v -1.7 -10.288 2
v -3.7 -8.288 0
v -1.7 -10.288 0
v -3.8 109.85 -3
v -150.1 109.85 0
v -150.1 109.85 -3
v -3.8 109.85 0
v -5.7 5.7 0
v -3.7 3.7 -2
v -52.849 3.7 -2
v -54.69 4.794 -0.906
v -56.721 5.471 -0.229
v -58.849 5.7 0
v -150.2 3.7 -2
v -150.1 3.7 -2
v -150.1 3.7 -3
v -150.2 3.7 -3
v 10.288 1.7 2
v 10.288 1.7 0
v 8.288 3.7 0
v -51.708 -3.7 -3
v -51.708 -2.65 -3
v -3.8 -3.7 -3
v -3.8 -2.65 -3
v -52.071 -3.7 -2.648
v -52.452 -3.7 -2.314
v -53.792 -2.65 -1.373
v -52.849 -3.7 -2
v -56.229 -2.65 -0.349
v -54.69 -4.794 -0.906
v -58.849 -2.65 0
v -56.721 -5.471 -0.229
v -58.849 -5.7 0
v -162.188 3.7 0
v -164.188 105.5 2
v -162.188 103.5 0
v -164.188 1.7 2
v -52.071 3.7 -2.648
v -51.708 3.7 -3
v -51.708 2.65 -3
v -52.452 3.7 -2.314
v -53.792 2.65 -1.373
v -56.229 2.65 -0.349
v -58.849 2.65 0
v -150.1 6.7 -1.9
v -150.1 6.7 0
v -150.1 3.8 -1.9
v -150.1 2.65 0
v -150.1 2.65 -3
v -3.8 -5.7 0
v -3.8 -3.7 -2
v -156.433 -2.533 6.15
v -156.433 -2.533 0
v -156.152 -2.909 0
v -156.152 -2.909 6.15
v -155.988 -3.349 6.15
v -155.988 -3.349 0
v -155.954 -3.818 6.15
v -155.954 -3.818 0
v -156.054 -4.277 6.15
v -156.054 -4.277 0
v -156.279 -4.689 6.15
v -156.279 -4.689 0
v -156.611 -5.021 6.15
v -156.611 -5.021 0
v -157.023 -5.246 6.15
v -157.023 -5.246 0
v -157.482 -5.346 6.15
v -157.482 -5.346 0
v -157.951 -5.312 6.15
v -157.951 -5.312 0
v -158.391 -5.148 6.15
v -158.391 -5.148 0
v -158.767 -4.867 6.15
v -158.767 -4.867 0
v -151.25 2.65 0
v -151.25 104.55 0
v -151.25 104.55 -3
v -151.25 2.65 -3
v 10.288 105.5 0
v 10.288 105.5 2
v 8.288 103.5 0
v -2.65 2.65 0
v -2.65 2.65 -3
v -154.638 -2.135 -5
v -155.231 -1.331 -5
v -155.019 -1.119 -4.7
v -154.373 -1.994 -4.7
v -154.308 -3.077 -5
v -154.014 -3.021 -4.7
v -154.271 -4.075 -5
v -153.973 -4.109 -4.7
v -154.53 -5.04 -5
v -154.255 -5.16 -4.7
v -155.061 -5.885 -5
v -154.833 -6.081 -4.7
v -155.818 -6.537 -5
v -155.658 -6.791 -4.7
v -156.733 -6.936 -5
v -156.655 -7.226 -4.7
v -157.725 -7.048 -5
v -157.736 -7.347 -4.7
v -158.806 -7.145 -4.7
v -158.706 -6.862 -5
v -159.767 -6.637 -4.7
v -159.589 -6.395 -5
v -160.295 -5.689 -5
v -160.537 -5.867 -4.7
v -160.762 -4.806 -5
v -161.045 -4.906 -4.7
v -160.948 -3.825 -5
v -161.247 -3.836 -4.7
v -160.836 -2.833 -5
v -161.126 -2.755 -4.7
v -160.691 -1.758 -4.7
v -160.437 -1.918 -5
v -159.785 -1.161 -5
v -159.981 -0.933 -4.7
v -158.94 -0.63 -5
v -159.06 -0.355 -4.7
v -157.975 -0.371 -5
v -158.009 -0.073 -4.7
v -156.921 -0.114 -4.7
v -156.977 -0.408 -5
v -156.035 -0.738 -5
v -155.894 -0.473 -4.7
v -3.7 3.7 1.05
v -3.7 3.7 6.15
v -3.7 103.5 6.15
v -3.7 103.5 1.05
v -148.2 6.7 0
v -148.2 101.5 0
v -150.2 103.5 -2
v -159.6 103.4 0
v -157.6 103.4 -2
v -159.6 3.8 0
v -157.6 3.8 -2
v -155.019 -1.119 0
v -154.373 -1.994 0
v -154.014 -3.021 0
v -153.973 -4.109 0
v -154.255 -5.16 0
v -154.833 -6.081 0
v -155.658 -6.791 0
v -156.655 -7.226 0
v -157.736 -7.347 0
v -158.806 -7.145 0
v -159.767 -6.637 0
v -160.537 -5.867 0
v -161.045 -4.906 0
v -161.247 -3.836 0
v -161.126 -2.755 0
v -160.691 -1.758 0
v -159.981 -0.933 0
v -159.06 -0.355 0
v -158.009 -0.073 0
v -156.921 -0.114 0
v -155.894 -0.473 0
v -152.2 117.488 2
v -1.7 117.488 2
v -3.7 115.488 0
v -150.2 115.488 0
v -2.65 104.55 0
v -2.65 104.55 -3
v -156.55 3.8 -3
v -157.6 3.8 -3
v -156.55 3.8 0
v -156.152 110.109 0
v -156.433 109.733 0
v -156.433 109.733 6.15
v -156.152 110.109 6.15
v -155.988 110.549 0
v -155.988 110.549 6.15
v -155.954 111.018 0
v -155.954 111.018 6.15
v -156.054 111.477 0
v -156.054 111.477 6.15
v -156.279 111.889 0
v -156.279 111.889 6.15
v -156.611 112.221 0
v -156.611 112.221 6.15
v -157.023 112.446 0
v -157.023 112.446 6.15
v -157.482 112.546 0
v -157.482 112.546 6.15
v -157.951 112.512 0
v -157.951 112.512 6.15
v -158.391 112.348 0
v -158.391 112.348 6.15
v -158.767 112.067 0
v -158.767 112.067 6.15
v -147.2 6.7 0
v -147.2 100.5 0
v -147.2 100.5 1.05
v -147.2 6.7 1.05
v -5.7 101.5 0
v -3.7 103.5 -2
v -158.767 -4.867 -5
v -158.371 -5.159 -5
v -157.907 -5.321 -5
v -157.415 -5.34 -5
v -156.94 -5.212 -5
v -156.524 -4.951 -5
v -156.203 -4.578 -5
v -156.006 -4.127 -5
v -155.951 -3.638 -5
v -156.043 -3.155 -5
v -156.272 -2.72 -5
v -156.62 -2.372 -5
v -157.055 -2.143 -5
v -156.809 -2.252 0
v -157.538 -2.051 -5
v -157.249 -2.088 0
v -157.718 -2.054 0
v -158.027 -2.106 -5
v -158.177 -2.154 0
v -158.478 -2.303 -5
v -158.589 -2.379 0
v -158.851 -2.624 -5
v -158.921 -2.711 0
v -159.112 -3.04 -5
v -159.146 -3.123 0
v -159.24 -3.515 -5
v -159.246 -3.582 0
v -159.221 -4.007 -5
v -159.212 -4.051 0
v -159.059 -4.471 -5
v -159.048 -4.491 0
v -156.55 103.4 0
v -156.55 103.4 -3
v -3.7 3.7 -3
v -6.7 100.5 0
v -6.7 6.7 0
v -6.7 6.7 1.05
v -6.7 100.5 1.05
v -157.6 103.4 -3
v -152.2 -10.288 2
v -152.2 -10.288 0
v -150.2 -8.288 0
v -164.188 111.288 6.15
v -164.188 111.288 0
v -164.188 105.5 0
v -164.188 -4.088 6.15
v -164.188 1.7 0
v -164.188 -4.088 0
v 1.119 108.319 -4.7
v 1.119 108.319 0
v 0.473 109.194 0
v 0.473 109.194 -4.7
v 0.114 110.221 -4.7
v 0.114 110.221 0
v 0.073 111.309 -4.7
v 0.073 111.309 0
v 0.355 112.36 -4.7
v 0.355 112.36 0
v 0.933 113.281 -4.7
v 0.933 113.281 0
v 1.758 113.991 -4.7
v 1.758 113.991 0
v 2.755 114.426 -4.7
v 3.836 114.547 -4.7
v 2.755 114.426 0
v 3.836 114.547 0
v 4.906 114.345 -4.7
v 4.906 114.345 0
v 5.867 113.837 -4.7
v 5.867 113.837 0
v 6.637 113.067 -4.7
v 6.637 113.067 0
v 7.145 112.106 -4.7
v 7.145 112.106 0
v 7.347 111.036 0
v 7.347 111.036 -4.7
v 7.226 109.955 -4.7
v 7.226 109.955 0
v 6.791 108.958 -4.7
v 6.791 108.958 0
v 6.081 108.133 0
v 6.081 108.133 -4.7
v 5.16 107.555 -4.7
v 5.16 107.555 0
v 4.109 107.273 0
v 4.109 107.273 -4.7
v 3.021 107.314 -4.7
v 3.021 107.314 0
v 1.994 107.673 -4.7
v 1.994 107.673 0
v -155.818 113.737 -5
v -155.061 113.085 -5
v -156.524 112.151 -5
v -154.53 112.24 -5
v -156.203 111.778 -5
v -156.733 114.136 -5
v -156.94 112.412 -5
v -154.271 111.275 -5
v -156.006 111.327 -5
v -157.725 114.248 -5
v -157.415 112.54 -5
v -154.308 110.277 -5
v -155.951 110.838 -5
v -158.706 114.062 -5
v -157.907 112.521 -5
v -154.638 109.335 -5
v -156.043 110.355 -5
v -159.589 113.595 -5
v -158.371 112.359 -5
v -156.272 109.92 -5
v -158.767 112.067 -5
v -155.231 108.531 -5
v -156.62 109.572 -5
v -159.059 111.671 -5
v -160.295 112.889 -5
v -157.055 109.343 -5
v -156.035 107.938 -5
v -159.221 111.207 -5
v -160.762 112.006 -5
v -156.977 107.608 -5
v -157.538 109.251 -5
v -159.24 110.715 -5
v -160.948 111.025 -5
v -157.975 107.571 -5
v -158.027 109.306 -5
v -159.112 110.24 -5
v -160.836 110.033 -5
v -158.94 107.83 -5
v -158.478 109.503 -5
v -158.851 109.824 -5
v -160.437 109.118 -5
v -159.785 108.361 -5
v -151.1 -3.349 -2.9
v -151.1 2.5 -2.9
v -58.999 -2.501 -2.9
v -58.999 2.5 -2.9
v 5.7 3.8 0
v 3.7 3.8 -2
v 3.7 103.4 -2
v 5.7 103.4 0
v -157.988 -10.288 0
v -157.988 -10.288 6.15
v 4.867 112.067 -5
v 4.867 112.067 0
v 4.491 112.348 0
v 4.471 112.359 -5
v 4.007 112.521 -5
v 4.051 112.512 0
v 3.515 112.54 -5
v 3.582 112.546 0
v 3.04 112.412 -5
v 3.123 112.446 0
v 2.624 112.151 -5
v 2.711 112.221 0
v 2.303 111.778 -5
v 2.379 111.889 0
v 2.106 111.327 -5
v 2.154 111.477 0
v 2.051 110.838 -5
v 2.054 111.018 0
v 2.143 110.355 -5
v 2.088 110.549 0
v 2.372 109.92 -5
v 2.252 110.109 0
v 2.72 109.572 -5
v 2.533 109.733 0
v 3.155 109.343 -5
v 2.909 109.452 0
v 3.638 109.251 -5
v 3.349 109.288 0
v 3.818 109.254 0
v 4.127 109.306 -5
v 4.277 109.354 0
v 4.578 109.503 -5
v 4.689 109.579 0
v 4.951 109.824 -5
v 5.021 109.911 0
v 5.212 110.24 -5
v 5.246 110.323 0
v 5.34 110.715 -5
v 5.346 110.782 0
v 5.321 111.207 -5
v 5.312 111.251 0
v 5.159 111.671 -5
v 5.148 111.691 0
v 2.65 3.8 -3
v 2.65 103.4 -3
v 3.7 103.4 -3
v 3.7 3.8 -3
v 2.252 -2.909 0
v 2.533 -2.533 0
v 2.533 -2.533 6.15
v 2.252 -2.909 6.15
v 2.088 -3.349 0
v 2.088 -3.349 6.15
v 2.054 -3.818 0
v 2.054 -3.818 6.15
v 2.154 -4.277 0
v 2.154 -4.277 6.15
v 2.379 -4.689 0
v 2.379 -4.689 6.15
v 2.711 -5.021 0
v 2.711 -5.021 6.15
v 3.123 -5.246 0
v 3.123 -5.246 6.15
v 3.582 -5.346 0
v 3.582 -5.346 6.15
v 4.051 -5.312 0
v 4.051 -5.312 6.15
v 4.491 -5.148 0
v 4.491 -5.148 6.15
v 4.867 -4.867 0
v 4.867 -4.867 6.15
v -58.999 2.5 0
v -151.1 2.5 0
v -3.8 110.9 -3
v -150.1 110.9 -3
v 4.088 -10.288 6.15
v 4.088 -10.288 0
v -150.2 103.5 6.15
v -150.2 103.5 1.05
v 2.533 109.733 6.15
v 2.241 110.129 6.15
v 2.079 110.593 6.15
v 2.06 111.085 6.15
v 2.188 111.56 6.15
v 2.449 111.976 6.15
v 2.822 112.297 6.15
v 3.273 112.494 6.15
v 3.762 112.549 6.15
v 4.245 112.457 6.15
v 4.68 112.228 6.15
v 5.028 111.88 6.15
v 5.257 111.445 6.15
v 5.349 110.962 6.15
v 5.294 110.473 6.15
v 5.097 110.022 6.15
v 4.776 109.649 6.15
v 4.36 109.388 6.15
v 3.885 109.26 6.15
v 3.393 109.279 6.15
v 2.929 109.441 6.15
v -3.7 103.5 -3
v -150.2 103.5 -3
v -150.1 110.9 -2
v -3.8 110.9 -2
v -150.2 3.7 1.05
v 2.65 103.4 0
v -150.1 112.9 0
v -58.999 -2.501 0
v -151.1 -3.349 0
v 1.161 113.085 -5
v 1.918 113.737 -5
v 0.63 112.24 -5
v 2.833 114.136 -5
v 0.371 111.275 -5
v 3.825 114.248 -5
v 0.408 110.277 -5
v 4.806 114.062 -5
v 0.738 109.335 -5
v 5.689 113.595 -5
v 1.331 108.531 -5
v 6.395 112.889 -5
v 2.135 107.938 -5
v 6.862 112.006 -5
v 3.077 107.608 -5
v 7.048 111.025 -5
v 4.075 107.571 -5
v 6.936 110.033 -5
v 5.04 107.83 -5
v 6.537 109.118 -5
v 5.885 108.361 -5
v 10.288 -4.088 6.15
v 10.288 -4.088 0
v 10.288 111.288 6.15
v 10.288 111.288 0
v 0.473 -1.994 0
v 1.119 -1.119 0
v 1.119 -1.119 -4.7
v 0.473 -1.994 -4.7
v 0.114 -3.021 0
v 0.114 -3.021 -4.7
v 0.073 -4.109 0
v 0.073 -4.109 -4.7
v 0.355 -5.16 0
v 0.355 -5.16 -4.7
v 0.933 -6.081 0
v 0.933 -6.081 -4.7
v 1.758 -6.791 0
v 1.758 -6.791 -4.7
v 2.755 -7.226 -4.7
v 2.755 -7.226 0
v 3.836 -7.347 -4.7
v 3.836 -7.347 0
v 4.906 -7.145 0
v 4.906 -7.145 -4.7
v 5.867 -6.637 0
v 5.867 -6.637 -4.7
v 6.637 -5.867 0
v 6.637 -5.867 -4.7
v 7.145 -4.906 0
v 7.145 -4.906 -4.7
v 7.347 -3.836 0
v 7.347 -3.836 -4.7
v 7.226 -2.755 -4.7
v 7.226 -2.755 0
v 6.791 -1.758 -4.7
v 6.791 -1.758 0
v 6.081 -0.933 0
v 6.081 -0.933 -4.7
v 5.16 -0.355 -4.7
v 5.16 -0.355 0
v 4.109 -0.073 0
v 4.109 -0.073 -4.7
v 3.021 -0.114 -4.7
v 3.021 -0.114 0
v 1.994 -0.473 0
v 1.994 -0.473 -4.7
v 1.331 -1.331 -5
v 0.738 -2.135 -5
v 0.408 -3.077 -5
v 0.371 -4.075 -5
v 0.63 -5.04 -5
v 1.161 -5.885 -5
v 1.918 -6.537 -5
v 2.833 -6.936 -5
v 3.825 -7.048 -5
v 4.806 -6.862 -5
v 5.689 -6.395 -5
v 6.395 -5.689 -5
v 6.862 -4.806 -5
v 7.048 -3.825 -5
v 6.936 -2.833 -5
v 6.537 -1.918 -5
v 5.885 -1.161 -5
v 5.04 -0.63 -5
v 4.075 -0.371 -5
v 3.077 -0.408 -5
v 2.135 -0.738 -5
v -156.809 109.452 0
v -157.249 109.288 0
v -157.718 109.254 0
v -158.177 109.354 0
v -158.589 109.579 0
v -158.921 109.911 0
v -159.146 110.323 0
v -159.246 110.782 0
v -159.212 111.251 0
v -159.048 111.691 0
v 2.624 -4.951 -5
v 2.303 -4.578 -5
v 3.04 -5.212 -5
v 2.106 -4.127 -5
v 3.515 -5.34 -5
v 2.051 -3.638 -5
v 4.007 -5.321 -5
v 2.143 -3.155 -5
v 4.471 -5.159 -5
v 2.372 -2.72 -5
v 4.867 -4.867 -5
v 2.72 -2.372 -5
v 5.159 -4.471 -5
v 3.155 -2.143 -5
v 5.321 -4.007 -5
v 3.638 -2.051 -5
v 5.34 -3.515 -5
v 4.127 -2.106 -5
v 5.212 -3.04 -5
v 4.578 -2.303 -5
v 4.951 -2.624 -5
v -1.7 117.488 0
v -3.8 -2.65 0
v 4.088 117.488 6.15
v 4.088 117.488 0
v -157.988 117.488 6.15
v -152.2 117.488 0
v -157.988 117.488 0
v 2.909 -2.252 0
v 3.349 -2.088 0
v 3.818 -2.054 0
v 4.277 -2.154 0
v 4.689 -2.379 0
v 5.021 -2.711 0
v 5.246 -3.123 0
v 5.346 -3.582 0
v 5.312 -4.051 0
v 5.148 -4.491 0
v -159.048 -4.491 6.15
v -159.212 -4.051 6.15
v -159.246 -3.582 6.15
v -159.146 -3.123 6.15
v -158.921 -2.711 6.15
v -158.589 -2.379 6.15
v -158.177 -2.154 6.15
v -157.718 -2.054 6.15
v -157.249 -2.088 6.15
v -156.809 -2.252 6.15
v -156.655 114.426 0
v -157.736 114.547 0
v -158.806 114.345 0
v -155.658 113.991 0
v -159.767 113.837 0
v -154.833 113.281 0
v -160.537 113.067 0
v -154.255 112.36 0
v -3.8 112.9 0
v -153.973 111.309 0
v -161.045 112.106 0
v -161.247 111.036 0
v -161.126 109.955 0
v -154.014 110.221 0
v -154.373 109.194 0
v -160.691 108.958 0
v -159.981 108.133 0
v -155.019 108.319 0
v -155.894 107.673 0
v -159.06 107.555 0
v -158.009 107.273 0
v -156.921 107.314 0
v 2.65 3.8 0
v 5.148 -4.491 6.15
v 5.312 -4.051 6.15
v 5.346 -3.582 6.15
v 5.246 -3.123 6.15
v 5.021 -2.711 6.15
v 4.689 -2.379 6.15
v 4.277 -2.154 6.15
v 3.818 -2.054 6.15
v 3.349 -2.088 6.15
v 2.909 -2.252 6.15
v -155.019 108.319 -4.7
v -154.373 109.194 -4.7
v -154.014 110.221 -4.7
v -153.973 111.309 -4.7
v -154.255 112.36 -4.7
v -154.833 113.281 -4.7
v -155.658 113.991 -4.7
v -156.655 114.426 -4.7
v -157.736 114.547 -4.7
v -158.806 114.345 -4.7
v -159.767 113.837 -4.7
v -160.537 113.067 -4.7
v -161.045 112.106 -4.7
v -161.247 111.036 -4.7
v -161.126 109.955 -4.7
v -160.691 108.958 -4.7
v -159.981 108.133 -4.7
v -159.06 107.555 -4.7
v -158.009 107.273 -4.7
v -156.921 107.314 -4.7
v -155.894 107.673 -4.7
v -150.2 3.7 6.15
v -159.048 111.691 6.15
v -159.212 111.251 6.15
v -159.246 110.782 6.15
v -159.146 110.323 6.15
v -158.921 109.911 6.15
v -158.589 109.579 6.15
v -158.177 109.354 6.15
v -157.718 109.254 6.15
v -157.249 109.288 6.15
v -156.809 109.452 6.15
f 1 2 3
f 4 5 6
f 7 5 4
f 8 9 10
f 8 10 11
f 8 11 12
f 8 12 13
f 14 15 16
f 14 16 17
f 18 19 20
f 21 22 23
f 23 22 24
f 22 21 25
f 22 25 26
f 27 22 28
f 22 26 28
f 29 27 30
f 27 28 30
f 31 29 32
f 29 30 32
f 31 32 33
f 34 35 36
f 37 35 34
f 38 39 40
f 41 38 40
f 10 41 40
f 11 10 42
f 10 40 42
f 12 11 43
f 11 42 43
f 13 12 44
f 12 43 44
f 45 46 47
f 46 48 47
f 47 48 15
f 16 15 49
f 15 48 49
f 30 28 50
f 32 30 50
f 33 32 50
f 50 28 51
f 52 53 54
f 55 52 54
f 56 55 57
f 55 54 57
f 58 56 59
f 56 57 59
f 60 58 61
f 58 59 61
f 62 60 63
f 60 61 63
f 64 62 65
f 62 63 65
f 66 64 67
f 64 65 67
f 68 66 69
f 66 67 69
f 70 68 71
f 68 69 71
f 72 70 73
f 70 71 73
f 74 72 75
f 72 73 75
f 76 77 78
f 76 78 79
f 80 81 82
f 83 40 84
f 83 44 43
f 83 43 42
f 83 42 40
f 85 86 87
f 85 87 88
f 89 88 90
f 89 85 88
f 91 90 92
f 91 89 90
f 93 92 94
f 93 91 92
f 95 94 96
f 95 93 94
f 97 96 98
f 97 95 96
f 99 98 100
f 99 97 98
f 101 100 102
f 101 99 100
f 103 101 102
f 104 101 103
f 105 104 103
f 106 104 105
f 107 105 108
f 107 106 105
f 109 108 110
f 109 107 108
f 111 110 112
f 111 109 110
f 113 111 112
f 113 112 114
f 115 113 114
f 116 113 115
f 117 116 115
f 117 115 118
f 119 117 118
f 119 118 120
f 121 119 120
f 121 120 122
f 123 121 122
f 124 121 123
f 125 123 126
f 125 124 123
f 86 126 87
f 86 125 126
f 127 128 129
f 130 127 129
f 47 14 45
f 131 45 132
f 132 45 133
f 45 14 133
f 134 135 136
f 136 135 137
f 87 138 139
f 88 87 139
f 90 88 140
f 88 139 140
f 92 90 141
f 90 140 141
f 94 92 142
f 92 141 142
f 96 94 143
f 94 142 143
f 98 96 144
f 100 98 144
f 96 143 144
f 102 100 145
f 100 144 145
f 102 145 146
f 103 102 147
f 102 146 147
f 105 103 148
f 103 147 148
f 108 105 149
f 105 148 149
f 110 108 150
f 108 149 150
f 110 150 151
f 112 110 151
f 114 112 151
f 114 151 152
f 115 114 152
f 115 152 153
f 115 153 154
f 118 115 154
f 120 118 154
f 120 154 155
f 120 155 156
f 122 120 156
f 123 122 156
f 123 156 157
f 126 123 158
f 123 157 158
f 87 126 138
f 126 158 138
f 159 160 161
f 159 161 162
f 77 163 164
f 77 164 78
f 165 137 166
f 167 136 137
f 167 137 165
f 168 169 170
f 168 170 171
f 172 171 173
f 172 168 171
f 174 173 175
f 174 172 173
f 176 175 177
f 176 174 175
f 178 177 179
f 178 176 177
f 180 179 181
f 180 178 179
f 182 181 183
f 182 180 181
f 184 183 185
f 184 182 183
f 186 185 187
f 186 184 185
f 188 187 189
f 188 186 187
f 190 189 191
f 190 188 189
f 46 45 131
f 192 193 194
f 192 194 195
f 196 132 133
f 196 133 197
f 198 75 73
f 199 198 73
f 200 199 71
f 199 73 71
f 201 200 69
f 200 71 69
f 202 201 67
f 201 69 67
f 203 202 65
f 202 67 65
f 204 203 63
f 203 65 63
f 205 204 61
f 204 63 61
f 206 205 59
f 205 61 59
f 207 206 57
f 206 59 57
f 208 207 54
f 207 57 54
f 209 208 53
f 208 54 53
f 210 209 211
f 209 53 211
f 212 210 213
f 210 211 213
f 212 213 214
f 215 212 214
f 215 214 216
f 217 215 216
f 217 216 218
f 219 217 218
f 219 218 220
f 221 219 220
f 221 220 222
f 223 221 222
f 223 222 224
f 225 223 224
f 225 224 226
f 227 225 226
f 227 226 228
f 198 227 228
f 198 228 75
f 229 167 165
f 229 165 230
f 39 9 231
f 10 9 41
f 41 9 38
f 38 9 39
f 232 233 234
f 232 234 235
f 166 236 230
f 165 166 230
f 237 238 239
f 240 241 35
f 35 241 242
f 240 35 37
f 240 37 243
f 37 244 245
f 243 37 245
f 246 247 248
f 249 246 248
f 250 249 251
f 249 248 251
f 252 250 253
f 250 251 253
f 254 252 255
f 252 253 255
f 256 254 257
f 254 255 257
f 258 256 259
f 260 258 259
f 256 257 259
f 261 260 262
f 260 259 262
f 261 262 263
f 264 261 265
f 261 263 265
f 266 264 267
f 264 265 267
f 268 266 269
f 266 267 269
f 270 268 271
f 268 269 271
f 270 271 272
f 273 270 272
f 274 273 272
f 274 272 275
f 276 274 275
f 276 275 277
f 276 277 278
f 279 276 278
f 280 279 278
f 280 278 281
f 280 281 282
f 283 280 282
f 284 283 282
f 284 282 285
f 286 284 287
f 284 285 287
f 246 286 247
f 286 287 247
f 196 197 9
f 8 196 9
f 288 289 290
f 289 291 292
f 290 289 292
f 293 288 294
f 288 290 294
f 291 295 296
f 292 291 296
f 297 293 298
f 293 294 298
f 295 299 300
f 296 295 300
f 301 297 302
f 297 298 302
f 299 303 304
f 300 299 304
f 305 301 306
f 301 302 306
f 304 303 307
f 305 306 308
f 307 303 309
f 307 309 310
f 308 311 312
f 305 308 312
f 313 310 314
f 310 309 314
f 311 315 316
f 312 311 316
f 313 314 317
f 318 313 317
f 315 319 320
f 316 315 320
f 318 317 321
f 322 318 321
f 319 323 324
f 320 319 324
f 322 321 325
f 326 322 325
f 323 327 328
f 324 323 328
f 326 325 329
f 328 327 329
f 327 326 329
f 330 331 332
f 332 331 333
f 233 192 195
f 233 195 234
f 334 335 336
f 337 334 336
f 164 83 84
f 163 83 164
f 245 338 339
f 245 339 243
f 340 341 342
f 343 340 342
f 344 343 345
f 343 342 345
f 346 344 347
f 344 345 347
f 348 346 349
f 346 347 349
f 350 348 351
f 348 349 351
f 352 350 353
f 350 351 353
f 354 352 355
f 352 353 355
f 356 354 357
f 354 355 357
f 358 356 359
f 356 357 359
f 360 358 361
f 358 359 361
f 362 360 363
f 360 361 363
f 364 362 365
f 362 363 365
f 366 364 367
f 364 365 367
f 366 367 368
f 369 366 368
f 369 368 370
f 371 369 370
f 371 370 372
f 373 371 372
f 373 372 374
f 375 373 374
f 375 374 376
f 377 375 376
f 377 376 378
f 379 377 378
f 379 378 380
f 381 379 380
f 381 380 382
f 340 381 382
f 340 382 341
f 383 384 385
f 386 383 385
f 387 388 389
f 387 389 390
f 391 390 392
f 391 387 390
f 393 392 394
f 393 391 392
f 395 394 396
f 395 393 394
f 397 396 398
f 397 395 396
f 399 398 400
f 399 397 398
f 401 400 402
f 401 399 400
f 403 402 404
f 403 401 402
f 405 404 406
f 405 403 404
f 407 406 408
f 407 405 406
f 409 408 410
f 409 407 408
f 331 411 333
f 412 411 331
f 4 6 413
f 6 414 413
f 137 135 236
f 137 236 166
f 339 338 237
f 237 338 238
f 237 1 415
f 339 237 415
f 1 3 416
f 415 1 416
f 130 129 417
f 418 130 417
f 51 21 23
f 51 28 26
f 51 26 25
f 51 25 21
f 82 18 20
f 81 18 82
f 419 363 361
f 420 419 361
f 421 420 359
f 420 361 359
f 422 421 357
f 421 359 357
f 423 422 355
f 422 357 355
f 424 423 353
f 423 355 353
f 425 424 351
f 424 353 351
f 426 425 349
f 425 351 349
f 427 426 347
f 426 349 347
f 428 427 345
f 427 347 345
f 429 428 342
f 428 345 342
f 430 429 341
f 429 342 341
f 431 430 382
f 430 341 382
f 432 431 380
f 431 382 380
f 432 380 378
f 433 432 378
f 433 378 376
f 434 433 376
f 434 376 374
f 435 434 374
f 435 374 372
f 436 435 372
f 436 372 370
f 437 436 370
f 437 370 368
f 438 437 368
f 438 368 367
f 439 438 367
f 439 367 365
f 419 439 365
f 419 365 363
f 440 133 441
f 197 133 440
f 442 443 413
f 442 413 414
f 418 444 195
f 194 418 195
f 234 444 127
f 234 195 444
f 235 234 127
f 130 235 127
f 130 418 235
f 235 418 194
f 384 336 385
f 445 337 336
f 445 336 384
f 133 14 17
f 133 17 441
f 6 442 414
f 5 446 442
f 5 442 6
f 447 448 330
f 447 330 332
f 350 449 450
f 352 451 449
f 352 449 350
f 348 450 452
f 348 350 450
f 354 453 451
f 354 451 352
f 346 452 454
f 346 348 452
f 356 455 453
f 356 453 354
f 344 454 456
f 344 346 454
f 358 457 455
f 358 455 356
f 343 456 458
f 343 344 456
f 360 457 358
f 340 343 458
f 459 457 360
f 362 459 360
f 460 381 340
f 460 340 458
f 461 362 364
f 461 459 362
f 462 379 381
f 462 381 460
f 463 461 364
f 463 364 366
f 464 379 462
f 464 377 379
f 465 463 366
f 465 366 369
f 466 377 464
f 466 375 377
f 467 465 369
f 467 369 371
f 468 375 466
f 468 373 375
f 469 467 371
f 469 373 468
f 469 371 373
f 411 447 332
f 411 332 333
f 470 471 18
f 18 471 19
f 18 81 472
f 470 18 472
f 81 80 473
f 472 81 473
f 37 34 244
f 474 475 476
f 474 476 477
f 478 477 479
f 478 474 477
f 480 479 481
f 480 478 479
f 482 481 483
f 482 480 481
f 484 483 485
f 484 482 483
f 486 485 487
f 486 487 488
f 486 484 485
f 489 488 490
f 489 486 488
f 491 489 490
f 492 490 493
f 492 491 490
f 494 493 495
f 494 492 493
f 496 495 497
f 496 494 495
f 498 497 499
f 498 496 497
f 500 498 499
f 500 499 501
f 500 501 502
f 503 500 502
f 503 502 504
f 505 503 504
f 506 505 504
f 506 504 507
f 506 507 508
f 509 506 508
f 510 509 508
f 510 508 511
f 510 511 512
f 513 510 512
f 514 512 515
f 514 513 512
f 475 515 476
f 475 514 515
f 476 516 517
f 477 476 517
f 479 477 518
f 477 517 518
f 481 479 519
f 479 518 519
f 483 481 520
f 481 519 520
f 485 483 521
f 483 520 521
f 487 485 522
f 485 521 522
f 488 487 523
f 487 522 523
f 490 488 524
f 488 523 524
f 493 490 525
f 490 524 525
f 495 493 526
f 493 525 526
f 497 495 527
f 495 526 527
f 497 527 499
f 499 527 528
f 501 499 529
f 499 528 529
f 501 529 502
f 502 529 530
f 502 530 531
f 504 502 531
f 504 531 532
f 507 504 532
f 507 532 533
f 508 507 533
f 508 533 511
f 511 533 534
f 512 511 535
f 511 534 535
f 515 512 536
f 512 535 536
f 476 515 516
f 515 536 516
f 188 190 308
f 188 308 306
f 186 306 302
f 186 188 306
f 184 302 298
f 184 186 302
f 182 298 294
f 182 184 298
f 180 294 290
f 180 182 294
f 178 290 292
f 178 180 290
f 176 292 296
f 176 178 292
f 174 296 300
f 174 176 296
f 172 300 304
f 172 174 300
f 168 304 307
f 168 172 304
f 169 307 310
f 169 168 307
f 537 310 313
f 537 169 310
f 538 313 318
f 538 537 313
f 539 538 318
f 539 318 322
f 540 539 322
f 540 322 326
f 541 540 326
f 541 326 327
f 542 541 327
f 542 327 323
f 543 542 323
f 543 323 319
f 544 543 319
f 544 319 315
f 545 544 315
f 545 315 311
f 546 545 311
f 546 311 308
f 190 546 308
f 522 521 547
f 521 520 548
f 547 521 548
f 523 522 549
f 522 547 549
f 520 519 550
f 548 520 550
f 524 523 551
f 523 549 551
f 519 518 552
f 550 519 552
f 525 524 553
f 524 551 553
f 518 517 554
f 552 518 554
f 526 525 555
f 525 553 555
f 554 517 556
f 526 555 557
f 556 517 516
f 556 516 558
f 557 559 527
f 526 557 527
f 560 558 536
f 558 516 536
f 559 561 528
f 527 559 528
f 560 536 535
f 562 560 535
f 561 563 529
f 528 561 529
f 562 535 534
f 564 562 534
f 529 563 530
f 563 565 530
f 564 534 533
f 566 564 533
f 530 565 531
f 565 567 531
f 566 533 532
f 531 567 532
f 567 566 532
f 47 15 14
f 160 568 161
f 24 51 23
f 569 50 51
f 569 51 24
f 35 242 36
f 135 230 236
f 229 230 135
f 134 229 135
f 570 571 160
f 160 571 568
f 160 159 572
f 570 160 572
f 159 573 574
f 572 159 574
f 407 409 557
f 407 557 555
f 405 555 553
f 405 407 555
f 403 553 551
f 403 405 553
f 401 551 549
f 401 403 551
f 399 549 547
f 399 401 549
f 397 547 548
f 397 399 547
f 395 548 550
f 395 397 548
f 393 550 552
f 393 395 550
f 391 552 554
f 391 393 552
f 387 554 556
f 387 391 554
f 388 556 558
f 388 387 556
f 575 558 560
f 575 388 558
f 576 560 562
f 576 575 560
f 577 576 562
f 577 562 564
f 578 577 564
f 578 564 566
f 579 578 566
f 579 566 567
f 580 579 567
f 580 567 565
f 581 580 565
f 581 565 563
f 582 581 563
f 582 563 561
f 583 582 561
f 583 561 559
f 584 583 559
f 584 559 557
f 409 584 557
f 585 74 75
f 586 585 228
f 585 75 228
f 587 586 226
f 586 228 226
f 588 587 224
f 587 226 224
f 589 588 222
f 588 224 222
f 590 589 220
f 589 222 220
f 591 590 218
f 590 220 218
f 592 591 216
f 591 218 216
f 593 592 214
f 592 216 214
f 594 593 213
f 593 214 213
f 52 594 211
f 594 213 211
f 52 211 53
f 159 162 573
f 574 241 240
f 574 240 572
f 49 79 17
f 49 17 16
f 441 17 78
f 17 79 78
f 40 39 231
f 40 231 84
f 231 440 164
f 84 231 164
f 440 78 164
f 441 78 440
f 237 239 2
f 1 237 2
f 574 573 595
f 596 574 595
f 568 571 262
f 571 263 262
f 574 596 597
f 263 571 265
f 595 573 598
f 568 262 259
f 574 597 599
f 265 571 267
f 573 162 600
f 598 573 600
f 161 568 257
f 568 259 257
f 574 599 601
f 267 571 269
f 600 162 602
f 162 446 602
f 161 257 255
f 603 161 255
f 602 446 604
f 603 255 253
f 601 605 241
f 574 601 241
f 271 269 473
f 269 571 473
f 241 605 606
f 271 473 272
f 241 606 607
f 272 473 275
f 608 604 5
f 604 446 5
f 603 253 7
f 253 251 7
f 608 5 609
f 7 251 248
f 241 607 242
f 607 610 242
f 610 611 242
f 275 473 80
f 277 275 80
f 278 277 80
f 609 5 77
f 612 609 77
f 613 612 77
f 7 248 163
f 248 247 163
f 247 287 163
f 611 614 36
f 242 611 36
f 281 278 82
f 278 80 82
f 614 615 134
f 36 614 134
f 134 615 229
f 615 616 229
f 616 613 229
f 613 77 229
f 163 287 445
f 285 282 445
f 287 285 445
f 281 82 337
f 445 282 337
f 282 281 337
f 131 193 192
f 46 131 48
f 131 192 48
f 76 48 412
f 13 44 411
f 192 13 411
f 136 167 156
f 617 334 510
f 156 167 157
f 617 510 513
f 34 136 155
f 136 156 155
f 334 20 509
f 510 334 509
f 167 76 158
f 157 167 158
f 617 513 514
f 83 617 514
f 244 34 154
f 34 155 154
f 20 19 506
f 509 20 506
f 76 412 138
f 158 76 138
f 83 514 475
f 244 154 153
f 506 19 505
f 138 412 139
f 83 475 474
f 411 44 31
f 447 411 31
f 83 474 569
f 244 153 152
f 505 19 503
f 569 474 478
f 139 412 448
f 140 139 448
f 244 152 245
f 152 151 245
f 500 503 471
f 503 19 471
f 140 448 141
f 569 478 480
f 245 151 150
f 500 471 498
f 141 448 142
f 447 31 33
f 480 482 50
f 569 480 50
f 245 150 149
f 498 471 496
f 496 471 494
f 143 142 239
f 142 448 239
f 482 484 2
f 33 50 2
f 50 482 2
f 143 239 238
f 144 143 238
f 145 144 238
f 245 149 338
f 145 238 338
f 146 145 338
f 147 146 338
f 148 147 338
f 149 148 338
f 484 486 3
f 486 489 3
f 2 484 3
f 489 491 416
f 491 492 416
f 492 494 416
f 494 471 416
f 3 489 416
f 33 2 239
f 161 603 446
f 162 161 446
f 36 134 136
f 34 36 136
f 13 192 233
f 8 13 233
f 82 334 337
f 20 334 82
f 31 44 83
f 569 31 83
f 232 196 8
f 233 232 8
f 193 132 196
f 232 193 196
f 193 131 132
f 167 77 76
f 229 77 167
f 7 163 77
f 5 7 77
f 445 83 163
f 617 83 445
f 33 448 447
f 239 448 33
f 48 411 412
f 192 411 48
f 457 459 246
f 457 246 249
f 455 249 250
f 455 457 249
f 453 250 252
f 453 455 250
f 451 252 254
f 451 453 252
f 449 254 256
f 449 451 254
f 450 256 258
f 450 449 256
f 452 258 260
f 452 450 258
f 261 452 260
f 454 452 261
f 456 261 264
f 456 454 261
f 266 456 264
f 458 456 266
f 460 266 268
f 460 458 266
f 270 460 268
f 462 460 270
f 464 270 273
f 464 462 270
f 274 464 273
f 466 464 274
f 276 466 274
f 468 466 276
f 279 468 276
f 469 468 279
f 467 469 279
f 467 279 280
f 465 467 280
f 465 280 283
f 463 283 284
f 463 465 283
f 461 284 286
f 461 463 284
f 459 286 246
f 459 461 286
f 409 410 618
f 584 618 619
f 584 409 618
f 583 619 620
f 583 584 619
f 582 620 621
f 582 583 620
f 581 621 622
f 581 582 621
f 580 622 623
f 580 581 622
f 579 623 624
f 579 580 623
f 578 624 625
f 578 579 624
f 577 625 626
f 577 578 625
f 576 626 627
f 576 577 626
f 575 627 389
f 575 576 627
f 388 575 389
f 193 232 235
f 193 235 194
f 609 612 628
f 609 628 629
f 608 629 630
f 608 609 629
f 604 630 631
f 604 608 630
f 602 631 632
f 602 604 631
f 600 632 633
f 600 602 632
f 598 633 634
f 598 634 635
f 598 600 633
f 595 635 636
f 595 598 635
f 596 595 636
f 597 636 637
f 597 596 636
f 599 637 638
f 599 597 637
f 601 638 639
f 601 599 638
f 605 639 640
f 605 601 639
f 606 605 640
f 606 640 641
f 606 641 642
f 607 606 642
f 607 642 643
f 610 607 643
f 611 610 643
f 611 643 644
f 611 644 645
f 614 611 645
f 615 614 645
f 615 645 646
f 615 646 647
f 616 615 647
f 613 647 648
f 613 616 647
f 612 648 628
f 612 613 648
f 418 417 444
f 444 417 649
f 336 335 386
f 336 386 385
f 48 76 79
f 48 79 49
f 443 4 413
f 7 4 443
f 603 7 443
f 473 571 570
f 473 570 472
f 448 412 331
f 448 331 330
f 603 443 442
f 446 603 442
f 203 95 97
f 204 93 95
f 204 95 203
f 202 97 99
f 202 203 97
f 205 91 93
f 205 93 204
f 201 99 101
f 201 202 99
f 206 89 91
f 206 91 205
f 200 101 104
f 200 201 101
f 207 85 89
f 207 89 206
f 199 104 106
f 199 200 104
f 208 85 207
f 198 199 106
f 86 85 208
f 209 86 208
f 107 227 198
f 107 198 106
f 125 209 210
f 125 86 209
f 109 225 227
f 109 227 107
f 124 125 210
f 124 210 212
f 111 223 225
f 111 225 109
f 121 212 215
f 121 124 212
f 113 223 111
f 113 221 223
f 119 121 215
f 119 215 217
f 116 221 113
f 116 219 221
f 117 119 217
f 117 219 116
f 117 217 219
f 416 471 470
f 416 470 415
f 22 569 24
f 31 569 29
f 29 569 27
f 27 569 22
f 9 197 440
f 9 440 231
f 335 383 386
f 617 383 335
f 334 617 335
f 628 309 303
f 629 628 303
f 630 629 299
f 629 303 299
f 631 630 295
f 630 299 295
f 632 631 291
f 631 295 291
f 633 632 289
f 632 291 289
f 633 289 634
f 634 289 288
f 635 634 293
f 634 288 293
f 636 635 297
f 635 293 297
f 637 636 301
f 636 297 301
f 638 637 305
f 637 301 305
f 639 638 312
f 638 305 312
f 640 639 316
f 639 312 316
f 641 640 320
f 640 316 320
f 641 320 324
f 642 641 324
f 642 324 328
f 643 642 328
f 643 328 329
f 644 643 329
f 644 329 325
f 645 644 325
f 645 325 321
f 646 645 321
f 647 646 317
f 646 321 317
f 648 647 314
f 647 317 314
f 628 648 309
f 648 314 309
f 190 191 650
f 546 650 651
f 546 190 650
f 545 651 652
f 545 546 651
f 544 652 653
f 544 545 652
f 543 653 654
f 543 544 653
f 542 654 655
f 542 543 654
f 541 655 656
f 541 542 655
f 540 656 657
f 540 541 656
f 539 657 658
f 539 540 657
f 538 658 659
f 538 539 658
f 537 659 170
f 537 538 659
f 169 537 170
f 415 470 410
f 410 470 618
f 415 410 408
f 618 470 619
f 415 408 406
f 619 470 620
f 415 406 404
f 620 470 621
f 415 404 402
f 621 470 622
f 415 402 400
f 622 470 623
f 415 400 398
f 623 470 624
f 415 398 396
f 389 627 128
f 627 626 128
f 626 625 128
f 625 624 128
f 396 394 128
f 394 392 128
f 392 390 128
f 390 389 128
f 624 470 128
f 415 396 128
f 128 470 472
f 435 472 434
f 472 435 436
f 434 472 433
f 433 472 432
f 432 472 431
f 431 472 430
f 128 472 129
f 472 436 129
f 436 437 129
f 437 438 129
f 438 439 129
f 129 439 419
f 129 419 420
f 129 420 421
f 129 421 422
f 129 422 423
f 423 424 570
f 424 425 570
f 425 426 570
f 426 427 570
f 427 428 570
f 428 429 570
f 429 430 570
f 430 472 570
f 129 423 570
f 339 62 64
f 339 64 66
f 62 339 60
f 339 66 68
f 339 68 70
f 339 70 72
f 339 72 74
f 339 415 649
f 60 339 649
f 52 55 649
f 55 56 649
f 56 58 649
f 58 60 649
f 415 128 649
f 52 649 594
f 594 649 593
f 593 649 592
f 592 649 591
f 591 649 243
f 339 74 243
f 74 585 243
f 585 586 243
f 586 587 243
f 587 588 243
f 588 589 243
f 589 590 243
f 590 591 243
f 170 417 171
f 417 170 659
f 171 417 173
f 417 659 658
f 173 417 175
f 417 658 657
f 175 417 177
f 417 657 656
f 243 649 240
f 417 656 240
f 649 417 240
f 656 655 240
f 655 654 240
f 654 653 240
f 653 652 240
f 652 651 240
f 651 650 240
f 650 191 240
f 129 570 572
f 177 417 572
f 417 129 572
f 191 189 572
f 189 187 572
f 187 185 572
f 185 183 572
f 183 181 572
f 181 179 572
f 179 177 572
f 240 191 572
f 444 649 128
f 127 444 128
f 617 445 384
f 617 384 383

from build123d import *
from build123d.topology import SkipClean

# Parameters (mm, degrees)
BOSS_EXTRUDE1_DEPTH                      = 3
BOSS_EXTRUDE1_2_DEPTH                    = 3
BOSS_EXTRUDE1_3_DEPTH                    = 3
BOSS_EXTRUDE1_4_DEPTH                    = 3
BOSS_EXTRUDE1_5_DEPTH                    = 3
BOSS_EXTRUDE2_DEPTH                      = 6.15
CHAMFER1_SIZE                            = 2
BOSS_EXTRUDE3_DEPTH                      = 3
MIRROR1_DEPTH                            = 2
CHAMFER2_SIZE                            = 2
CUT_EXTRUDE2_DEPTH                       = 5.1
BOSS_EXTRUDE4_DEPTH                      = 5
CUT_EXTRUDE4_DEPTH                       = 202.98709309422546
MIRROR3_AT_THE_SECOND_PLANE_COPY_1_DEPTH = 5
MIRROR3_AT_THE_SECOND_PLANE_COPY_2_DEPTH = 202.98709309422546
CHAMFER3_SIZE                            = 0.3
CUT_EXTRUDE3_REACH                       = 210.139
BOSS_EXTRUDE5_DEPTH                      = 2.9


# Read off the part's stored shape, not the designer's step: Mirror1
with BuildPart() as part:
    # Sketch1 → Boss-Extrude1 (new body)
    with BuildSketch(Plane.XY):
        Polygon((-156.55, 3.799999999998499), (-156.55000000000007, 103.39999999999857), (-157.60000000000005, 103.39999999999857), (-157.60000000000002, 3.799999999998499), align=None)
    extrude(amount=-BOSS_EXTRUDE1_DEPTH)



with BuildPart() as body_2:
    # Sketch1 → Boss-Extrude1 2 (new body)
    with BuildSketch(Plane.XY):
        Polygon((-150.1, 109.84999999999852), (-3.800000000000109, 109.84999999999862), (-3.800000000000109, 110.89999999999861), (-150.10000000000008, 110.8999999999985), align=None)
    extrude(amount=-BOSS_EXTRUDE1_2_DEPTH)


with BuildPart() as body_3:
    # Sketch1 → Boss-Extrude1 3 (new body)
    with BuildSketch(Plane.XY):
        Polygon((2.6499999999999164, 103.39999999999867), (2.649999999999972, 3.7999999999985548), (3.6999999999999673, 3.7999999999985477), (3.6999999999999256, 103.39999999999867), align=None)
    extrude(amount=-BOSS_EXTRUDE1_3_DEPTH)


with BuildPart() as body_4:
    # Sketch1 → Boss-Extrude1 4 (new body)
    with BuildSketch(Plane.XY):
        Polygon((-3.800000000000109, -2.6500000000013597), (-150.09999999999997, -2.650000000001457), (-150.09999999999997, -3.700000000001438), (-3.8000000000000393, -3.7000000000013826), align=None)
    extrude(amount=-BOSS_EXTRUDE1_4_DEPTH)


with BuildPart() as body_5:
    # Sketch1 → Boss-Extrude1 5 (new body)
    with BuildSketch(Plane.XY):
        Polygon((-151.25, 2.6499999999985424), (-2.6500000000000274, 2.6499999999986117), (-2.650000000000083, 104.54999999999862), (-151.25000000000006, 104.54999999999853), align=None)
        Polygon((-150.20000000000005, 103.49999999999854), (-3.7000000000000783, 103.49999999999862), (-3.700000000000023, 3.699999999998614), (-150.2, 3.699999999998545), align=None, mode=Mode.SUBTRACT)
    extrude(amount=-BOSS_EXTRUDE1_5_DEPTH)


with BuildPart() as part_1:
    add(part.part)

    add(body_2.part)  # Boss-Extrude2 merges body 2

    add(body_3.part)  # Boss-Extrude2 merges body 3

    add(body_4.part)  # Boss-Extrude2 merges body 4

    add(body_5.part)  # Boss-Extrude2 merges body 5
    # Sketch2 → Boss-Extrude2 (add)
    with BuildSketch(Plane.XY):
        Polygon((-152.20000000000053, -10.287704918043708), (-157.98770491803333, -10.287704918043712), (-164.18770491803335, -4.087704918043719), (-164.18770491803335, 1.699999999989038), (-164.18770491803284, 105.49999999999856), (-164.18770491803284, 111.28770491803135), (-157.98770491803285, 117.48770491803134), (-152.20000000000007, 117.48770491803134), (-1.700000000000101, 117.48770491803131), (4.087704918032683, 117.48770491803131), (10.287704918032786, 111.28770491801959), (10.287704918032786, 105.49999999998684), (10.287704918032786, 1.6999999999890605), (10.287704918032786, -4.087704918043723), (4.087704918032788, -10.28770491804372), (-1.6999999999999682, -10.28770491804372), align=None)
        Polygon((-147.2, 6.699999999998546), (-6.700000000000024, 6.699999999998613), (-6.700000000000077, 100.49999999999862), (-147.20000000000005, 100.49999999999854), align=None, mode=Mode.SUBTRACT)
    extrude(amount=BOSS_EXTRUDE2_DEPTH)

    # Chamfer1
    chamfer1_edges = [part_1.edges().sort_by_distance(p)[0] for p in [
        (7.187704918032787, -7.187704918043722, 0),
        (10.287704918032786, 53.59999999998793, 0),
        (7.187704918032734, 114.38770491802545, 0),
        (-76.95000000000007, 117.48770491803133, 0),
        (-161.08770491803284, 114.38770491803135, 0),
        (-164.1877049180331, 53.59999999999382, 0),
        (-161.08770491803335, -7.187704918043716, 0),
        (-76.95000000000027, -10.287704918043715, 0),
    ]]
    chamfer(chamfer1_edges, length=CHAMFER1_SIZE)

    # Sketch4 → Boss-Extrude3 (add)
    with BuildSketch(Plane(origin=(0, 0, 0), x_dir=(-1, 0, 0), z_dir=(0, 0, -1))):
        Polygon((1.7000000000001219, 1.6999999999889326), (-10.287704918032786, 1.699999999988929), (-10.287704918032786, -4.087704918043727), (-4.087704918032788, -10.28770491804372), (1.7000000000001094, -10.28770491804372), align=None)
        Polygon((164.18770491803335, -4.087704918043719), (164.18770491803332, 1.6999999999889503), (152.20000000000041, 1.6999999999889481), (152.20000000000007, -10.287704918043712), (157.98770491803333, -10.287704918043712), align=None)
        Polygon((157.98770491803285, 117.48770491803134), (152.20000000000033, 117.48770491803134), (152.20000000000002, 105.4999999999988), (164.18770491803286, 105.4999999999988), (164.18770491803284, 111.28770491803135), align=None)
        Polygon((1.7000000000001085, 105.49999999999868), (1.7000000000001094, 117.48770491803131), (-4.087704918032671, 117.48770491803131), (-10.287704918032784, 111.28770491801959), (-10.287704918032786, 105.49999999999868), align=None)
    extrude(amount=-BOSS_EXTRUDE3_DEPTH)

    # Sketch5 → Loft1 section 0
    with BuildSketch(Plane(origin=(0, 0, 0), x_dir=(-1, 0, 0), z_dir=(0, 0, -1)), mode=Mode.PRIVATE) as loft1_s0:
        with BuildLine():
            Line((-10.287704918032686, 105.49999999999868), (-8.287704918032702, 103.49999999999875))
            Line((-8.287704918032702, 103.49999999999875), (-8.287704918032702, 105.49999999999868))
            Line((-8.287704918032702, 105.49999999999868), (-10.287704918032686, 105.49999999999868))
        make_face()
    loft([loft1_s0.sketch, Vertex(10.287704918, 105.5, 2)])

    # Sketch7 → Loft2 section 0
    with BuildSketch(Plane(origin=(0, 0, 0), x_dir=(-1, 0, 0), z_dir=(0, 0, -1)), mode=Mode.PRIVATE) as loft2_s0:
        with BuildLine():
            Line((1.700000000000108, 117.48770491803134), (3.7000000000000757, 115.48770491803135))
            Line((3.7000000000000757, 115.48770491803135), (1.7000000000001079, 115.48770491803133))
            Line((1.7000000000001079, 115.48770491803133), (1.700000000000108, 117.48770491803134))
        make_face()
    loft([Vertex(-1.7, 117.487704918, 2), loft2_s0.sketch])

    # Mirror1 outline → Mirror1 (add)
    with BuildSketch(Plane.XY):
        Polygon((-1.7, 1.7), (10.287704918, 1.7), (-1.7, 13.687704918), align=None)
        Polygon((-1.7, -10.287704918), (-1.7, 1.7), (-13.687704918, 1.7), align=None)
        Polygon((-152.2, -10.287704918), (-140.212295082, 1.7), (-152.2, 1.7), align=None)
        Polygon((-152.2, 105.5), (-140.212295082, 105.5), (-152.2, 117.487704918), align=None)
        Polygon((-164.187704918, 1.7), (-152.2, 1.7), (-152.2, 13.687704918), align=None)
        Polygon((-152.2, 93.512295082), (-152.2, 105.5), (-164.187704918, 105.5), align=None)
    extrude(amount=MIRROR1_DEPTH)

    # Chamfer2
    chamfer2_edges = [part_1.edges().sort_by_distance(p)[0] for p in [
        (-76.9500000000001, 110.89999999999856, 0),
        (-157.60000000000002, 53.59999999999854, 0),
        (3.6999999999999464, 53.59999999999861, 0),
        (-76.95, -3.7000000000014106, 0),
        (-150.20000000000002, 53.599999999998545, 0),
        (-76.95000000000006, 103.49999999999858, 0),
        (-3.700000000000051, 53.599999999998616, 0),
        (-76.95, 3.6999999999985795, 0),
    ]]
    chamfer(chamfer2_edges, length=CHAMFER2_SIZE)

    # Sketch11 → Cut-Extrude2 (cut)
    with BuildSketch(Plane.XY.offset(6.15)):
        Polygon((-150.2, 3.6999999999985453), (-3.700000000000023, 3.6999999999986137), (-3.7000000000000783, 103.49999999999862), (-150.20000000000005, 103.49999999999854), align=None)
    extrude(amount=-CUT_EXTRUDE2_DEPTH, mode=Mode.SUBTRACT)

    # Sketch12 → Boss-Extrude4 (add)
    with BuildSketch(Plane(origin=(0, 0, 0), x_dir=(-1, 0, 0), z_dir=(0, 0, -1))):
        with BuildLine():
            ThreePointArc((161.25000000000057, -3.700000000010667), (158.9967945281331, -0.32783970634446824), (155.01906024866963, -1.119060248679844))
            Line((155.01906024866966, -1.1190602486798047), (156.4332738110427, -2.5332738110529105))
            ThreePointArc((156.4332738110427, -2.533273811052915), (158.23142766340297, -2.175598771367012), (159.2500000000006, -3.700000000010667))
            ThreePointArc((159.2500000000006, -3.7000000000106676), (159.12440122864422, -4.331427663413119), (158.76672618895833, -4.866726188968555))
            Line((158.7667261889583, -4.866726188968588), (160.18093975133135, -6.280939751341704))
            ThreePointArc((160.18093975133138, -6.2809397513416645), (160.97216029366675, -5.096794528143313), (161.25000000000057, -3.700000000010668))
        make_face()
        with BuildLine():
            Line((156.4332738110427, -2.5332738110529105), (155.01906024866966, -1.1190602486798047))
            ThreePointArc((155.01906024866963, -1.119060248679844), (155.0190602486697, -6.280939751341531), (160.18093975133138, -6.2809397513416645))
            Line((160.18093975133135, -6.280939751341704), (158.7667261889583, -4.866726188968588))
            ThreePointArc((158.76672618895833, -4.866726188968555), (156.43327381104277, -4.866726188968477), (156.4332738110427, -2.533273811052915))
        make_face()
    boss_extrude4 = extrude(amount=BOSS_EXTRUDE4_DEPTH)

    # Sketch12<4> → Cut-Extrude4 (cut, through all)
    with SkipClean():  # the faces are left unmerged after this step: merging them gives an invalid solid
        with BuildSketch(Plane(origin=(0, 0, 0), x_dir=(-1, 0, 0), z_dir=(0, 0, -1))):
            with BuildLine():
                ThreePointArc((159.2500000000006, -3.700000000010667), (158.23142766340297, -2.175598771367012), (156.4332738110427, -2.533273811052915))
                Line((156.4332738110427, -2.5332738110529105), (158.7667261889583, -4.866726188968588))
                ThreePointArc((158.76672618895833, -4.866726188968555), (159.12440122864422, -4.331427663413119), (159.2500000000006, -3.7000000000106676))
            make_face()
            with BuildLine():
                Line((158.7667261889583, -4.866726188968588), (156.4332738110427, -2.5332738110529105))
                ThreePointArc((156.4332738110427, -2.533273811052915), (156.43327381104277, -4.866726188968477), (158.76672618895833, -4.866726188968555))
            make_face()
        cut_extrude4 = extrude(amount=-CUT_EXTRUDE4_DEPTH, mode=Mode.SUBTRACT)

    # Mirror3: Boss-Extrude4, Cut-Extrude4 across plane
    with SkipClean():  # the faces are left unmerged after this step: merging them gives an invalid solid
        add(boss_extrude4.mirror(Plane(origin=(-76.95, -4.412e-14, 0), x_dir=(0, 0, 1), z_dir=(1, 5.7e-16, 0))))
        add(cut_extrude4.mirror(Plane(origin=(-76.95, -4.412e-14, 0), x_dir=(0, 0, 1), z_dir=(1, 5.7e-16, 0))), mode=Mode.SUBTRACT)

    # Mirror3 at the second plane: Boss-Extrude4, Cut-Extrude4 across plane
    add(boss_extrude4.mirror(Plane(origin=(-2.846e-14, 53.59999999999862, 0), x_dir=(0, 0, 1), z_dir=(5.3e-16, -1, 0))))
    add(cut_extrude4.mirror(Plane(origin=(-2.846e-14, 53.59999999999862, 0), x_dir=(0, 0, 1), z_dir=(5.3e-16, -1, 0))), mode=Mode.SUBTRACT)

    # Mirror3 at the second plane copy 1 sketc → Mirror3 at the second plane copy 1 (add)
    with BuildSketch(Plane(origin=(-153.90000000000006, 107.19999999999717, 0), x_dir=(1, -8e-17, 0), z_dir=(0, 0, -1))):
        with BuildLine():
            ThreePointArc((161.25000000000057, -3.700000000010667), (158.9967945281331, -0.32783970634446824), (155.01906024866963, -1.119060248679844))
            Line((155.01906024866966, -1.1190602486798047), (156.4332738110427, -2.5332738110529105))
            ThreePointArc((156.4332738110427, -2.533273811052915), (158.23142766340297, -2.175598771367012), (159.2500000000006, -3.700000000010667))
            ThreePointArc((159.2500000000006, -3.7000000000106676), (159.12440122864422, -4.331427663413119), (158.76672618895833, -4.866726188968555))
            Line((158.7667261889583, -4.866726188968588), (160.18093975133135, -6.280939751341704))
            ThreePointArc((160.18093975133138, -6.2809397513416645), (160.97216029366675, -5.096794528143313), (161.25000000000057, -3.700000000010668))
        make_face()
        with BuildLine():
            Line((156.4332738110427, -2.5332738110529105), (155.01906024866966, -1.1190602486798047))
            ThreePointArc((155.01906024866963, -1.119060248679844), (155.0190602486697, -6.280939751341531), (160.18093975133138, -6.2809397513416645))
            Line((160.18093975133135, -6.280939751341704), (158.7667261889583, -4.866726188968588))
            ThreePointArc((158.76672618895833, -4.866726188968555), (156.43327381104277, -4.866726188968477), (156.4332738110427, -2.533273811052915))
        make_face()
    extrude(amount=MIRROR3_AT_THE_SECOND_PLANE_COPY_1_DEPTH)

    # Mirror3 at the second plane copy 2 sketc → Mirror3 at the second plane copy 2 (cut, through all)
    with BuildSketch(Plane(origin=(-153.90000000000006, 107.19999999999717, 0), x_dir=(1, -8e-17, 0), z_dir=(0, 0, -1))):
        with BuildLine():
            ThreePointArc((159.2500000000006, -3.700000000010667), (158.23142766340297, -2.175598771367012), (156.4332738110427, -2.533273811052915))
            Line((156.4332738110427, -2.5332738110529105), (158.7667261889583, -4.866726188968588))
            ThreePointArc((158.76672618895833, -4.866726188968555), (159.12440122864422, -4.331427663413119), (159.2500000000006, -3.7000000000106676))
        make_face()
        with BuildLine():
            Line((158.7667261889583, -4.866726188968588), (156.4332738110427, -2.5332738110529105))
            ThreePointArc((156.4332738110427, -2.533273811052915), (156.43327381104277, -4.866726188968477), (158.76672618895833, -4.866726188968555))
        make_face()
    extrude(amount=-MIRROR3_AT_THE_SECOND_PLANE_COPY_2_DEPTH, mode=Mode.SUBTRACT)

    # Chamfer3
    chamfer3_edges = [part_1.edges().sort_by_distance(p)[0] for p in [
        (-160.1809397513315, -6.280939751341554, -5),
        (-160.18093975133155, 113.48093975133862, -5),
        (6.2809397513314895, -6.28093975134146, -5),
        (6.280939751331427, 113.48093975133872, -5),
    ]]
    chamfer(chamfer3_edges, length=CHAMFER3_SIZE)

    # Cut-Extrude3: up to this face of the body (flat: up to its plane)
    cut_extrude3_end = Plane(part_1.part.faces().sort_by_distance((-76.95, 6.7, 0.525))[0])
    # Sketch13 → Cut-Extrude3 (cut, up to the picked face)
    with BuildSketch(Plane.XZ.offset(10.287704918043616), mode=Mode.PRIVATE) as cut_extrude3_sk1:
        with BuildLine():
            Line((-150.0999999999928, -67.22813782152119), (-150.0999999999928, -72.29000000000016))
            Line((-150.0999999999928, -72.29000000000016), (-3.7999999999928646, -72.29000000000016))
            Line((-3.7999999999928646, -72.29000000000016), (-3.7999999999928646, -67.22813782152119))
            Line((-3.7999999999928646, -67.22813782152119), (-6.199494936604516, -66.24854811567278))
            Line((-6.199494936604516, -66.24854811567278), (-6.199494936604544, -58.741451884327546))
            Line((-6.199494936604544, -58.741451884327546), (-3.7999999999928646, -57.761862178479156))
            Line((-3.7999999999928646, -57.761862178479156), (-3.7999999999928646, -49.700000000000145))
            Line((-3.7999999999928646, -49.700000000000145), (-75.49999999999261, -49.700000000000145))
            ThreePointArc((-75.49999999999261, -49.700000000000145), (-82.57106781185809, -46.77106781186563), (-85.49999999999261, -39.70000000000015))
            Line((-85.49999999999261, -39.70000000000015), (-85.49999999999261, -38.980000000000146))
            ThreePointArc((-85.49999999999261, -38.980000000000146), (-82.57106781185809, -31.908932188134674), (-75.49999999999261, -28.98000000000015))
            Line((-75.49999999999261, -28.98000000000015), (-58.849285999992624, -28.980000000000146))
            ThreePointArc((-58.849285999992624, -28.980000000000146), (-51.77821818812715, -26.05106781186562), (-48.849285999992624, -18.980000000000143))
            Line((-48.849285999992624, -18.980000000000143), (-48.849285999992624, -10.000000000000114))
            ThreePointArc((-48.849285999992624, -10.000000000000114), (-51.77821818812715, -2.9289321881346364), (-58.84928599999263, -1.1102e-13))
            Line((-58.84928599999263, -1.1102e-13), (-150.0999999999928, -1.1102e-13))
            Line((-150.0999999999928, -1.1102e-13), (-150.0999999999928, -7.231885425213205))
            ThreePointArc((-150.0999999999928, -7.231885425213205), (-149.02970711803647, -5.622570324451265), (-147.19999999999283, -5.000000000000131))
            Line((-147.19999999999283, -5.000000000000131), (-100.49999999999262, -5.0000000000001155))
            ThreePointArc((-100.49999999999262, -5.0000000000001155), (-93.42893218812715, -7.928932188134643), (-90.49999999999262, -15.000000000000117))
            Line((-90.49999999999262, -15.000000000000117), (-90.49999999999261, -51.70000000000015))
            ThreePointArc((-90.49999999999261, -51.70000000000015), (-91.37867965643296, -53.8213203435598), (-93.49999999999261, -54.70000000000015))
            Line((-93.49999999999261, -54.70000000000015), (-147.1999999999928, -54.70000000000015))
            ThreePointArc((-147.1999999999928, -54.70000000000015), (-149.02970711803647, -54.077429675549006), (-150.0999999999928, -52.468114574787016))
            Line((-150.0999999999928, -52.468114574787016), (-150.0999999999928, -57.761862178479156))
            Line((-150.0999999999928, -57.761862178479156), (-147.70050506338106, -58.74145188432755))
            Line((-147.70050506338106, -58.74145188432755), (-147.70050506338112, -66.24854811567279))
            Line((-147.70050506338112, -66.24854811567279), (-150.0999999999928, -67.22813782152119))
        make_face()
    cut_extrude3_tool1 = split(extrude(cut_extrude3_sk1.sketch, amount=-CUT_EXTRUDE3_REACH, mode=Mode.PRIVATE), bisect_by=cut_extrude3_end, keep=Keep.BOTH, mode=Mode.PRIVATE)
    add(cut_extrude3_tool1.solids().sort_by(Axis((-150.02498, -10.287705, -55.370637), (-6e-16, 1, 0)))[0], mode=Mode.SUBTRACT)

    # Sketch14 → Boss-Extrude5 (add)
    with BuildSketch(Plane(origin=(0, 0, 0), x_dir=(-1, 0, 0), z_dir=(0, 0, -1))):
        Polygon((58.99928599999263, -2.5013735128958055), (58.99928599999263, 2.4999999999986255), (151.1, 2.4999999999986255), (151.1, -3.3486137939698013), align=None)
    extrude(amount=BOSS_EXTRUDE5_DEPTH)


solid = part_1.part
